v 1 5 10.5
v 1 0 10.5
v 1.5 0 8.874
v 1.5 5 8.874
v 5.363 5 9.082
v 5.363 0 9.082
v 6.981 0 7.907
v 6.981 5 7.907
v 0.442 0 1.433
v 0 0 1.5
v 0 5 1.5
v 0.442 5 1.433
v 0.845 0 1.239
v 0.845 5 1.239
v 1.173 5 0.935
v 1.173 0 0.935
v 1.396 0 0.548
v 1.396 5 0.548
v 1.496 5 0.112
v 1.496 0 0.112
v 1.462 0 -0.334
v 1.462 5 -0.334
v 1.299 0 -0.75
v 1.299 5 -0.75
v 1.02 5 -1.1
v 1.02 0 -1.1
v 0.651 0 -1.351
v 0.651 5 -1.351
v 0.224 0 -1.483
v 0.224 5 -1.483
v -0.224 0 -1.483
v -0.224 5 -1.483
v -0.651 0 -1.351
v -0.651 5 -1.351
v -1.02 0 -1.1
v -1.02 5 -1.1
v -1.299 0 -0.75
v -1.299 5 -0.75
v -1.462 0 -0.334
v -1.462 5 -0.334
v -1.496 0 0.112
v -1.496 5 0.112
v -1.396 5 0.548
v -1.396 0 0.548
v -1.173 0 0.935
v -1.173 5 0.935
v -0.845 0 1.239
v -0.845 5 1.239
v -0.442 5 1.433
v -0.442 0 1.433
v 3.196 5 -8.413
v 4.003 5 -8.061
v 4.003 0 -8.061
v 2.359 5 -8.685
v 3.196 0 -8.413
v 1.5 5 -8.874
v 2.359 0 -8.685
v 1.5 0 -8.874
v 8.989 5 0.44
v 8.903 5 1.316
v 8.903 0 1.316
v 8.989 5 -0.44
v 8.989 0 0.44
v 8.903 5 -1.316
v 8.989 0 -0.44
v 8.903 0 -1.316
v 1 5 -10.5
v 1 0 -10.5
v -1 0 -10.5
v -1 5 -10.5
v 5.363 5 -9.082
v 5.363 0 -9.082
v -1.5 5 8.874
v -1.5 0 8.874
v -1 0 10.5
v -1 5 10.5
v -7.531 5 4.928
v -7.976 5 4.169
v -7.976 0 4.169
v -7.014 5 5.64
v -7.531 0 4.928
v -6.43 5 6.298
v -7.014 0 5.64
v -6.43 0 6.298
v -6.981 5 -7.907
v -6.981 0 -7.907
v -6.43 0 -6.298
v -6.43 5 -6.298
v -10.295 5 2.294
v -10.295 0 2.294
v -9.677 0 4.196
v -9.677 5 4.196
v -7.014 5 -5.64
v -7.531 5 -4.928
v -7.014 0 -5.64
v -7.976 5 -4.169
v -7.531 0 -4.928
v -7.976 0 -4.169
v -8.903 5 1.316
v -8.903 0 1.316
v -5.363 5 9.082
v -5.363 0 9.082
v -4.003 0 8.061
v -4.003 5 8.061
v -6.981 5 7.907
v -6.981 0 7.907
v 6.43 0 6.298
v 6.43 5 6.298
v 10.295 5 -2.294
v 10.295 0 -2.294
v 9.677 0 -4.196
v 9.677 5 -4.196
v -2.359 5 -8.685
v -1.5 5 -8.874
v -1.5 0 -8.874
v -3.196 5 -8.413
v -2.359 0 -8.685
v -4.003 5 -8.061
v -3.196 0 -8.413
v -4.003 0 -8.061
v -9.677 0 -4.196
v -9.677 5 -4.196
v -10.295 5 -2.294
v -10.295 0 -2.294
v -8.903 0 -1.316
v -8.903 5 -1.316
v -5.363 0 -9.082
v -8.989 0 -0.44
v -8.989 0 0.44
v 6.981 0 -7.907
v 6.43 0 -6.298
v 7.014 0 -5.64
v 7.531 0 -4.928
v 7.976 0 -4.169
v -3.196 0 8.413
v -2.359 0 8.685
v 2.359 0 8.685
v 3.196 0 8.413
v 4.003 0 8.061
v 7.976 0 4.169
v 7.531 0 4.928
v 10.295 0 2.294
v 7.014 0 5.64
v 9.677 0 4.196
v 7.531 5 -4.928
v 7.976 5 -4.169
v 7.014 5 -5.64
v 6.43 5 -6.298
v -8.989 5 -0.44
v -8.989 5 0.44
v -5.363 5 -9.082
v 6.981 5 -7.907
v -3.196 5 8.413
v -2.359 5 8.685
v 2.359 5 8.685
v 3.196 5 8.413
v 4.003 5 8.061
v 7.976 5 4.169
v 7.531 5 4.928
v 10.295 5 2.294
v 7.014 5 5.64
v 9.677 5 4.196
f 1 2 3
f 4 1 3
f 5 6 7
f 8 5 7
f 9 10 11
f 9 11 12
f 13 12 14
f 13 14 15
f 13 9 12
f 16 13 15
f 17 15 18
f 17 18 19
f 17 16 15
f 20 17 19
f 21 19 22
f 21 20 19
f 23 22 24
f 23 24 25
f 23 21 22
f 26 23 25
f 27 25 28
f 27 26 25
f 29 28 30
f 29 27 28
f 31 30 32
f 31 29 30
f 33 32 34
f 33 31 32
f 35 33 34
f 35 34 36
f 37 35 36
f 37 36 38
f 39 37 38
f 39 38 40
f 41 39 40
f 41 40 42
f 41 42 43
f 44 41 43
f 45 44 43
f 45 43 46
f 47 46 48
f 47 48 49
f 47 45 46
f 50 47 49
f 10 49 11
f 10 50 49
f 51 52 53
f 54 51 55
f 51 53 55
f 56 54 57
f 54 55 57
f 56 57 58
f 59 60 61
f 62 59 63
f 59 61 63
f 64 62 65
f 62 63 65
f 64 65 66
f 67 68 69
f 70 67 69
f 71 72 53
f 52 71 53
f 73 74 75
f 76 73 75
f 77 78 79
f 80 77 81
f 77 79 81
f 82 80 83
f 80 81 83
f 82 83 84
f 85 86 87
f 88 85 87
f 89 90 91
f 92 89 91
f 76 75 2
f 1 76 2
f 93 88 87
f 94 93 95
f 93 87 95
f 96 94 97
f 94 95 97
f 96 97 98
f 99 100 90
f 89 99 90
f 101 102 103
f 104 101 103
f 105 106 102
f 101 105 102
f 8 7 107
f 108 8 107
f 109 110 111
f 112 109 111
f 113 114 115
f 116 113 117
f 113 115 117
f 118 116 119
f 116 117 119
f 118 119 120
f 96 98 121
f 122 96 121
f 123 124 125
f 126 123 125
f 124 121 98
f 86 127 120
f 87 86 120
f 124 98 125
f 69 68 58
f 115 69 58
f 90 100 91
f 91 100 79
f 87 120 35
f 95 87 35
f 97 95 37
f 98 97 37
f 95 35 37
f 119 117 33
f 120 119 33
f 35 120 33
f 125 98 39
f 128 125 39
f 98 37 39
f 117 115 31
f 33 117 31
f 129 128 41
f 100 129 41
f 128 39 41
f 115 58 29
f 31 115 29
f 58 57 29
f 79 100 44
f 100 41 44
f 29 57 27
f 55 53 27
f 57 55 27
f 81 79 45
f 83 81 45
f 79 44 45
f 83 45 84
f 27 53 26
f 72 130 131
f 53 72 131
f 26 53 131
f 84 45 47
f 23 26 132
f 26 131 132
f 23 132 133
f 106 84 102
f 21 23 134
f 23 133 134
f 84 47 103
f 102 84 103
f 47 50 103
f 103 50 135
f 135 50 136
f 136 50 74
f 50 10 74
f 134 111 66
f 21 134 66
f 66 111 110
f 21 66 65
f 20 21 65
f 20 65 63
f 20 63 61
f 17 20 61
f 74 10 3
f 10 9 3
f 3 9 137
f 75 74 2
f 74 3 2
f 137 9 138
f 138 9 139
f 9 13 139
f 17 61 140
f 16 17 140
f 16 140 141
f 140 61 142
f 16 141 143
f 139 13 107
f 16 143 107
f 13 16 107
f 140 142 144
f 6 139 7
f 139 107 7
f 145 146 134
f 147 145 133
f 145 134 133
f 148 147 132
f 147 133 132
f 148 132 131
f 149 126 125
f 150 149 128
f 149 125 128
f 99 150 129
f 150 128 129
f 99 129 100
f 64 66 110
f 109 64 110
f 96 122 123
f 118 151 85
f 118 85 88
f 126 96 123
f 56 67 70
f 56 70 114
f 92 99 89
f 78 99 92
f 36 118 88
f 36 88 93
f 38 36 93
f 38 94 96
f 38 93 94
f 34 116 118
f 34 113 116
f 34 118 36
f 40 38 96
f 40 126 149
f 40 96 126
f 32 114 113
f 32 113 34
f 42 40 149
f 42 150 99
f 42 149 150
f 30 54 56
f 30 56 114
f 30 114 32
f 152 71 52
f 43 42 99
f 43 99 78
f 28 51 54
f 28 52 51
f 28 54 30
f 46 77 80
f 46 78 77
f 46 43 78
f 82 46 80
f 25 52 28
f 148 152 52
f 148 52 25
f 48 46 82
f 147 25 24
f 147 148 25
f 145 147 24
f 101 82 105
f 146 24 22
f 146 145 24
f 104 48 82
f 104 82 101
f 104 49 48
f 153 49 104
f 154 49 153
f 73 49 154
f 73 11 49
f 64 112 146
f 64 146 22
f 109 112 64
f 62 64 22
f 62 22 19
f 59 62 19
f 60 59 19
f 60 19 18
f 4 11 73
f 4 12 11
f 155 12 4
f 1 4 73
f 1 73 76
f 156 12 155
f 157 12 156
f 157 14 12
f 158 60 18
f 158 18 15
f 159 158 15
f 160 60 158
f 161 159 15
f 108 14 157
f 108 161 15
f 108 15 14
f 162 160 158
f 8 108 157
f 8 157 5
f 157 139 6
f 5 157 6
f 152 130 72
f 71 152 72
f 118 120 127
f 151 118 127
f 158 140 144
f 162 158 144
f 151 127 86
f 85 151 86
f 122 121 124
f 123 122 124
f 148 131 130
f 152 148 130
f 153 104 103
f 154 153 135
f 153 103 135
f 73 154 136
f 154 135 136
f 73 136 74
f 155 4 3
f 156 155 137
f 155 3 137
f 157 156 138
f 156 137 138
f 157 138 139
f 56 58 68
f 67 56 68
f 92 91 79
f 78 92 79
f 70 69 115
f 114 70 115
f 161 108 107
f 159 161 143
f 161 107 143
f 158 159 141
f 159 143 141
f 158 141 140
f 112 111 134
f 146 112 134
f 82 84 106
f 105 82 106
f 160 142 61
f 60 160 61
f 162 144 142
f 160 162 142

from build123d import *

# Parameters (mm, degrees)
SKETCH_1_R               = 9
SKETCH_1_R_2             = 1.5
EXTRUDE_1_DEPTH          = 5
EXTRUDE_START            = -5
EXTRUDE_2_DEPTH          = 5
PATTERN_CIRCULAR_1_COUNT = 10


with BuildPart() as part:
    # 草图1 → 凸台-拉伸1 (new body)
    with BuildSketch(Plane(origin=(0, 0, 0), x_dir=(1, 0, 0), z_dir=(0, 1, 0))):
        with Locations(Location((0, 0, 0), (0, 0, 270))):
            Circle(SKETCH_1_R)
        with Locations(Location((0, 0, 0), (0, 0, 270))):
            Circle(SKETCH_1_R_2, mode=Mode.SUBTRACT)
    extrude(amount=EXTRUDE_1_DEPTH)

    # 草图2 → 凸台-拉伸2 (add)
    with BuildSketch(Plane(origin=(0, 5, 0), x_dir=(1, 0, 0), z_dir=(0, 1, 0)).offset(EXTRUDE_START)):
        with BuildLine():
            Line((1.5, 8.874119675), (1, 10.5))
            Line((1, 10.5), (-1, 10.5))
            Line((-1, 10.5), (-1.5, 8.874119675))
            ThreePointArc((-1.5, 8.874119675), (0, 9), (1.5, 8.874119675))
        make_face()
    extrude_2 = extrude(amount=EXTRUDE_2_DEPTH)

    # 阵列(圆周)1: 凸台-拉伸2 ×10 about axis
    pattern_circular_1_axis = Axis((0, 0, 0), (0, 1, 0))
    for i in range(1, PATTERN_CIRCULAR_1_COUNT):
        add(extrude_2.rotate(pattern_circular_1_axis, i * 360 / PATTERN_CIRCULAR_1_COUNT))


solid = part.part
